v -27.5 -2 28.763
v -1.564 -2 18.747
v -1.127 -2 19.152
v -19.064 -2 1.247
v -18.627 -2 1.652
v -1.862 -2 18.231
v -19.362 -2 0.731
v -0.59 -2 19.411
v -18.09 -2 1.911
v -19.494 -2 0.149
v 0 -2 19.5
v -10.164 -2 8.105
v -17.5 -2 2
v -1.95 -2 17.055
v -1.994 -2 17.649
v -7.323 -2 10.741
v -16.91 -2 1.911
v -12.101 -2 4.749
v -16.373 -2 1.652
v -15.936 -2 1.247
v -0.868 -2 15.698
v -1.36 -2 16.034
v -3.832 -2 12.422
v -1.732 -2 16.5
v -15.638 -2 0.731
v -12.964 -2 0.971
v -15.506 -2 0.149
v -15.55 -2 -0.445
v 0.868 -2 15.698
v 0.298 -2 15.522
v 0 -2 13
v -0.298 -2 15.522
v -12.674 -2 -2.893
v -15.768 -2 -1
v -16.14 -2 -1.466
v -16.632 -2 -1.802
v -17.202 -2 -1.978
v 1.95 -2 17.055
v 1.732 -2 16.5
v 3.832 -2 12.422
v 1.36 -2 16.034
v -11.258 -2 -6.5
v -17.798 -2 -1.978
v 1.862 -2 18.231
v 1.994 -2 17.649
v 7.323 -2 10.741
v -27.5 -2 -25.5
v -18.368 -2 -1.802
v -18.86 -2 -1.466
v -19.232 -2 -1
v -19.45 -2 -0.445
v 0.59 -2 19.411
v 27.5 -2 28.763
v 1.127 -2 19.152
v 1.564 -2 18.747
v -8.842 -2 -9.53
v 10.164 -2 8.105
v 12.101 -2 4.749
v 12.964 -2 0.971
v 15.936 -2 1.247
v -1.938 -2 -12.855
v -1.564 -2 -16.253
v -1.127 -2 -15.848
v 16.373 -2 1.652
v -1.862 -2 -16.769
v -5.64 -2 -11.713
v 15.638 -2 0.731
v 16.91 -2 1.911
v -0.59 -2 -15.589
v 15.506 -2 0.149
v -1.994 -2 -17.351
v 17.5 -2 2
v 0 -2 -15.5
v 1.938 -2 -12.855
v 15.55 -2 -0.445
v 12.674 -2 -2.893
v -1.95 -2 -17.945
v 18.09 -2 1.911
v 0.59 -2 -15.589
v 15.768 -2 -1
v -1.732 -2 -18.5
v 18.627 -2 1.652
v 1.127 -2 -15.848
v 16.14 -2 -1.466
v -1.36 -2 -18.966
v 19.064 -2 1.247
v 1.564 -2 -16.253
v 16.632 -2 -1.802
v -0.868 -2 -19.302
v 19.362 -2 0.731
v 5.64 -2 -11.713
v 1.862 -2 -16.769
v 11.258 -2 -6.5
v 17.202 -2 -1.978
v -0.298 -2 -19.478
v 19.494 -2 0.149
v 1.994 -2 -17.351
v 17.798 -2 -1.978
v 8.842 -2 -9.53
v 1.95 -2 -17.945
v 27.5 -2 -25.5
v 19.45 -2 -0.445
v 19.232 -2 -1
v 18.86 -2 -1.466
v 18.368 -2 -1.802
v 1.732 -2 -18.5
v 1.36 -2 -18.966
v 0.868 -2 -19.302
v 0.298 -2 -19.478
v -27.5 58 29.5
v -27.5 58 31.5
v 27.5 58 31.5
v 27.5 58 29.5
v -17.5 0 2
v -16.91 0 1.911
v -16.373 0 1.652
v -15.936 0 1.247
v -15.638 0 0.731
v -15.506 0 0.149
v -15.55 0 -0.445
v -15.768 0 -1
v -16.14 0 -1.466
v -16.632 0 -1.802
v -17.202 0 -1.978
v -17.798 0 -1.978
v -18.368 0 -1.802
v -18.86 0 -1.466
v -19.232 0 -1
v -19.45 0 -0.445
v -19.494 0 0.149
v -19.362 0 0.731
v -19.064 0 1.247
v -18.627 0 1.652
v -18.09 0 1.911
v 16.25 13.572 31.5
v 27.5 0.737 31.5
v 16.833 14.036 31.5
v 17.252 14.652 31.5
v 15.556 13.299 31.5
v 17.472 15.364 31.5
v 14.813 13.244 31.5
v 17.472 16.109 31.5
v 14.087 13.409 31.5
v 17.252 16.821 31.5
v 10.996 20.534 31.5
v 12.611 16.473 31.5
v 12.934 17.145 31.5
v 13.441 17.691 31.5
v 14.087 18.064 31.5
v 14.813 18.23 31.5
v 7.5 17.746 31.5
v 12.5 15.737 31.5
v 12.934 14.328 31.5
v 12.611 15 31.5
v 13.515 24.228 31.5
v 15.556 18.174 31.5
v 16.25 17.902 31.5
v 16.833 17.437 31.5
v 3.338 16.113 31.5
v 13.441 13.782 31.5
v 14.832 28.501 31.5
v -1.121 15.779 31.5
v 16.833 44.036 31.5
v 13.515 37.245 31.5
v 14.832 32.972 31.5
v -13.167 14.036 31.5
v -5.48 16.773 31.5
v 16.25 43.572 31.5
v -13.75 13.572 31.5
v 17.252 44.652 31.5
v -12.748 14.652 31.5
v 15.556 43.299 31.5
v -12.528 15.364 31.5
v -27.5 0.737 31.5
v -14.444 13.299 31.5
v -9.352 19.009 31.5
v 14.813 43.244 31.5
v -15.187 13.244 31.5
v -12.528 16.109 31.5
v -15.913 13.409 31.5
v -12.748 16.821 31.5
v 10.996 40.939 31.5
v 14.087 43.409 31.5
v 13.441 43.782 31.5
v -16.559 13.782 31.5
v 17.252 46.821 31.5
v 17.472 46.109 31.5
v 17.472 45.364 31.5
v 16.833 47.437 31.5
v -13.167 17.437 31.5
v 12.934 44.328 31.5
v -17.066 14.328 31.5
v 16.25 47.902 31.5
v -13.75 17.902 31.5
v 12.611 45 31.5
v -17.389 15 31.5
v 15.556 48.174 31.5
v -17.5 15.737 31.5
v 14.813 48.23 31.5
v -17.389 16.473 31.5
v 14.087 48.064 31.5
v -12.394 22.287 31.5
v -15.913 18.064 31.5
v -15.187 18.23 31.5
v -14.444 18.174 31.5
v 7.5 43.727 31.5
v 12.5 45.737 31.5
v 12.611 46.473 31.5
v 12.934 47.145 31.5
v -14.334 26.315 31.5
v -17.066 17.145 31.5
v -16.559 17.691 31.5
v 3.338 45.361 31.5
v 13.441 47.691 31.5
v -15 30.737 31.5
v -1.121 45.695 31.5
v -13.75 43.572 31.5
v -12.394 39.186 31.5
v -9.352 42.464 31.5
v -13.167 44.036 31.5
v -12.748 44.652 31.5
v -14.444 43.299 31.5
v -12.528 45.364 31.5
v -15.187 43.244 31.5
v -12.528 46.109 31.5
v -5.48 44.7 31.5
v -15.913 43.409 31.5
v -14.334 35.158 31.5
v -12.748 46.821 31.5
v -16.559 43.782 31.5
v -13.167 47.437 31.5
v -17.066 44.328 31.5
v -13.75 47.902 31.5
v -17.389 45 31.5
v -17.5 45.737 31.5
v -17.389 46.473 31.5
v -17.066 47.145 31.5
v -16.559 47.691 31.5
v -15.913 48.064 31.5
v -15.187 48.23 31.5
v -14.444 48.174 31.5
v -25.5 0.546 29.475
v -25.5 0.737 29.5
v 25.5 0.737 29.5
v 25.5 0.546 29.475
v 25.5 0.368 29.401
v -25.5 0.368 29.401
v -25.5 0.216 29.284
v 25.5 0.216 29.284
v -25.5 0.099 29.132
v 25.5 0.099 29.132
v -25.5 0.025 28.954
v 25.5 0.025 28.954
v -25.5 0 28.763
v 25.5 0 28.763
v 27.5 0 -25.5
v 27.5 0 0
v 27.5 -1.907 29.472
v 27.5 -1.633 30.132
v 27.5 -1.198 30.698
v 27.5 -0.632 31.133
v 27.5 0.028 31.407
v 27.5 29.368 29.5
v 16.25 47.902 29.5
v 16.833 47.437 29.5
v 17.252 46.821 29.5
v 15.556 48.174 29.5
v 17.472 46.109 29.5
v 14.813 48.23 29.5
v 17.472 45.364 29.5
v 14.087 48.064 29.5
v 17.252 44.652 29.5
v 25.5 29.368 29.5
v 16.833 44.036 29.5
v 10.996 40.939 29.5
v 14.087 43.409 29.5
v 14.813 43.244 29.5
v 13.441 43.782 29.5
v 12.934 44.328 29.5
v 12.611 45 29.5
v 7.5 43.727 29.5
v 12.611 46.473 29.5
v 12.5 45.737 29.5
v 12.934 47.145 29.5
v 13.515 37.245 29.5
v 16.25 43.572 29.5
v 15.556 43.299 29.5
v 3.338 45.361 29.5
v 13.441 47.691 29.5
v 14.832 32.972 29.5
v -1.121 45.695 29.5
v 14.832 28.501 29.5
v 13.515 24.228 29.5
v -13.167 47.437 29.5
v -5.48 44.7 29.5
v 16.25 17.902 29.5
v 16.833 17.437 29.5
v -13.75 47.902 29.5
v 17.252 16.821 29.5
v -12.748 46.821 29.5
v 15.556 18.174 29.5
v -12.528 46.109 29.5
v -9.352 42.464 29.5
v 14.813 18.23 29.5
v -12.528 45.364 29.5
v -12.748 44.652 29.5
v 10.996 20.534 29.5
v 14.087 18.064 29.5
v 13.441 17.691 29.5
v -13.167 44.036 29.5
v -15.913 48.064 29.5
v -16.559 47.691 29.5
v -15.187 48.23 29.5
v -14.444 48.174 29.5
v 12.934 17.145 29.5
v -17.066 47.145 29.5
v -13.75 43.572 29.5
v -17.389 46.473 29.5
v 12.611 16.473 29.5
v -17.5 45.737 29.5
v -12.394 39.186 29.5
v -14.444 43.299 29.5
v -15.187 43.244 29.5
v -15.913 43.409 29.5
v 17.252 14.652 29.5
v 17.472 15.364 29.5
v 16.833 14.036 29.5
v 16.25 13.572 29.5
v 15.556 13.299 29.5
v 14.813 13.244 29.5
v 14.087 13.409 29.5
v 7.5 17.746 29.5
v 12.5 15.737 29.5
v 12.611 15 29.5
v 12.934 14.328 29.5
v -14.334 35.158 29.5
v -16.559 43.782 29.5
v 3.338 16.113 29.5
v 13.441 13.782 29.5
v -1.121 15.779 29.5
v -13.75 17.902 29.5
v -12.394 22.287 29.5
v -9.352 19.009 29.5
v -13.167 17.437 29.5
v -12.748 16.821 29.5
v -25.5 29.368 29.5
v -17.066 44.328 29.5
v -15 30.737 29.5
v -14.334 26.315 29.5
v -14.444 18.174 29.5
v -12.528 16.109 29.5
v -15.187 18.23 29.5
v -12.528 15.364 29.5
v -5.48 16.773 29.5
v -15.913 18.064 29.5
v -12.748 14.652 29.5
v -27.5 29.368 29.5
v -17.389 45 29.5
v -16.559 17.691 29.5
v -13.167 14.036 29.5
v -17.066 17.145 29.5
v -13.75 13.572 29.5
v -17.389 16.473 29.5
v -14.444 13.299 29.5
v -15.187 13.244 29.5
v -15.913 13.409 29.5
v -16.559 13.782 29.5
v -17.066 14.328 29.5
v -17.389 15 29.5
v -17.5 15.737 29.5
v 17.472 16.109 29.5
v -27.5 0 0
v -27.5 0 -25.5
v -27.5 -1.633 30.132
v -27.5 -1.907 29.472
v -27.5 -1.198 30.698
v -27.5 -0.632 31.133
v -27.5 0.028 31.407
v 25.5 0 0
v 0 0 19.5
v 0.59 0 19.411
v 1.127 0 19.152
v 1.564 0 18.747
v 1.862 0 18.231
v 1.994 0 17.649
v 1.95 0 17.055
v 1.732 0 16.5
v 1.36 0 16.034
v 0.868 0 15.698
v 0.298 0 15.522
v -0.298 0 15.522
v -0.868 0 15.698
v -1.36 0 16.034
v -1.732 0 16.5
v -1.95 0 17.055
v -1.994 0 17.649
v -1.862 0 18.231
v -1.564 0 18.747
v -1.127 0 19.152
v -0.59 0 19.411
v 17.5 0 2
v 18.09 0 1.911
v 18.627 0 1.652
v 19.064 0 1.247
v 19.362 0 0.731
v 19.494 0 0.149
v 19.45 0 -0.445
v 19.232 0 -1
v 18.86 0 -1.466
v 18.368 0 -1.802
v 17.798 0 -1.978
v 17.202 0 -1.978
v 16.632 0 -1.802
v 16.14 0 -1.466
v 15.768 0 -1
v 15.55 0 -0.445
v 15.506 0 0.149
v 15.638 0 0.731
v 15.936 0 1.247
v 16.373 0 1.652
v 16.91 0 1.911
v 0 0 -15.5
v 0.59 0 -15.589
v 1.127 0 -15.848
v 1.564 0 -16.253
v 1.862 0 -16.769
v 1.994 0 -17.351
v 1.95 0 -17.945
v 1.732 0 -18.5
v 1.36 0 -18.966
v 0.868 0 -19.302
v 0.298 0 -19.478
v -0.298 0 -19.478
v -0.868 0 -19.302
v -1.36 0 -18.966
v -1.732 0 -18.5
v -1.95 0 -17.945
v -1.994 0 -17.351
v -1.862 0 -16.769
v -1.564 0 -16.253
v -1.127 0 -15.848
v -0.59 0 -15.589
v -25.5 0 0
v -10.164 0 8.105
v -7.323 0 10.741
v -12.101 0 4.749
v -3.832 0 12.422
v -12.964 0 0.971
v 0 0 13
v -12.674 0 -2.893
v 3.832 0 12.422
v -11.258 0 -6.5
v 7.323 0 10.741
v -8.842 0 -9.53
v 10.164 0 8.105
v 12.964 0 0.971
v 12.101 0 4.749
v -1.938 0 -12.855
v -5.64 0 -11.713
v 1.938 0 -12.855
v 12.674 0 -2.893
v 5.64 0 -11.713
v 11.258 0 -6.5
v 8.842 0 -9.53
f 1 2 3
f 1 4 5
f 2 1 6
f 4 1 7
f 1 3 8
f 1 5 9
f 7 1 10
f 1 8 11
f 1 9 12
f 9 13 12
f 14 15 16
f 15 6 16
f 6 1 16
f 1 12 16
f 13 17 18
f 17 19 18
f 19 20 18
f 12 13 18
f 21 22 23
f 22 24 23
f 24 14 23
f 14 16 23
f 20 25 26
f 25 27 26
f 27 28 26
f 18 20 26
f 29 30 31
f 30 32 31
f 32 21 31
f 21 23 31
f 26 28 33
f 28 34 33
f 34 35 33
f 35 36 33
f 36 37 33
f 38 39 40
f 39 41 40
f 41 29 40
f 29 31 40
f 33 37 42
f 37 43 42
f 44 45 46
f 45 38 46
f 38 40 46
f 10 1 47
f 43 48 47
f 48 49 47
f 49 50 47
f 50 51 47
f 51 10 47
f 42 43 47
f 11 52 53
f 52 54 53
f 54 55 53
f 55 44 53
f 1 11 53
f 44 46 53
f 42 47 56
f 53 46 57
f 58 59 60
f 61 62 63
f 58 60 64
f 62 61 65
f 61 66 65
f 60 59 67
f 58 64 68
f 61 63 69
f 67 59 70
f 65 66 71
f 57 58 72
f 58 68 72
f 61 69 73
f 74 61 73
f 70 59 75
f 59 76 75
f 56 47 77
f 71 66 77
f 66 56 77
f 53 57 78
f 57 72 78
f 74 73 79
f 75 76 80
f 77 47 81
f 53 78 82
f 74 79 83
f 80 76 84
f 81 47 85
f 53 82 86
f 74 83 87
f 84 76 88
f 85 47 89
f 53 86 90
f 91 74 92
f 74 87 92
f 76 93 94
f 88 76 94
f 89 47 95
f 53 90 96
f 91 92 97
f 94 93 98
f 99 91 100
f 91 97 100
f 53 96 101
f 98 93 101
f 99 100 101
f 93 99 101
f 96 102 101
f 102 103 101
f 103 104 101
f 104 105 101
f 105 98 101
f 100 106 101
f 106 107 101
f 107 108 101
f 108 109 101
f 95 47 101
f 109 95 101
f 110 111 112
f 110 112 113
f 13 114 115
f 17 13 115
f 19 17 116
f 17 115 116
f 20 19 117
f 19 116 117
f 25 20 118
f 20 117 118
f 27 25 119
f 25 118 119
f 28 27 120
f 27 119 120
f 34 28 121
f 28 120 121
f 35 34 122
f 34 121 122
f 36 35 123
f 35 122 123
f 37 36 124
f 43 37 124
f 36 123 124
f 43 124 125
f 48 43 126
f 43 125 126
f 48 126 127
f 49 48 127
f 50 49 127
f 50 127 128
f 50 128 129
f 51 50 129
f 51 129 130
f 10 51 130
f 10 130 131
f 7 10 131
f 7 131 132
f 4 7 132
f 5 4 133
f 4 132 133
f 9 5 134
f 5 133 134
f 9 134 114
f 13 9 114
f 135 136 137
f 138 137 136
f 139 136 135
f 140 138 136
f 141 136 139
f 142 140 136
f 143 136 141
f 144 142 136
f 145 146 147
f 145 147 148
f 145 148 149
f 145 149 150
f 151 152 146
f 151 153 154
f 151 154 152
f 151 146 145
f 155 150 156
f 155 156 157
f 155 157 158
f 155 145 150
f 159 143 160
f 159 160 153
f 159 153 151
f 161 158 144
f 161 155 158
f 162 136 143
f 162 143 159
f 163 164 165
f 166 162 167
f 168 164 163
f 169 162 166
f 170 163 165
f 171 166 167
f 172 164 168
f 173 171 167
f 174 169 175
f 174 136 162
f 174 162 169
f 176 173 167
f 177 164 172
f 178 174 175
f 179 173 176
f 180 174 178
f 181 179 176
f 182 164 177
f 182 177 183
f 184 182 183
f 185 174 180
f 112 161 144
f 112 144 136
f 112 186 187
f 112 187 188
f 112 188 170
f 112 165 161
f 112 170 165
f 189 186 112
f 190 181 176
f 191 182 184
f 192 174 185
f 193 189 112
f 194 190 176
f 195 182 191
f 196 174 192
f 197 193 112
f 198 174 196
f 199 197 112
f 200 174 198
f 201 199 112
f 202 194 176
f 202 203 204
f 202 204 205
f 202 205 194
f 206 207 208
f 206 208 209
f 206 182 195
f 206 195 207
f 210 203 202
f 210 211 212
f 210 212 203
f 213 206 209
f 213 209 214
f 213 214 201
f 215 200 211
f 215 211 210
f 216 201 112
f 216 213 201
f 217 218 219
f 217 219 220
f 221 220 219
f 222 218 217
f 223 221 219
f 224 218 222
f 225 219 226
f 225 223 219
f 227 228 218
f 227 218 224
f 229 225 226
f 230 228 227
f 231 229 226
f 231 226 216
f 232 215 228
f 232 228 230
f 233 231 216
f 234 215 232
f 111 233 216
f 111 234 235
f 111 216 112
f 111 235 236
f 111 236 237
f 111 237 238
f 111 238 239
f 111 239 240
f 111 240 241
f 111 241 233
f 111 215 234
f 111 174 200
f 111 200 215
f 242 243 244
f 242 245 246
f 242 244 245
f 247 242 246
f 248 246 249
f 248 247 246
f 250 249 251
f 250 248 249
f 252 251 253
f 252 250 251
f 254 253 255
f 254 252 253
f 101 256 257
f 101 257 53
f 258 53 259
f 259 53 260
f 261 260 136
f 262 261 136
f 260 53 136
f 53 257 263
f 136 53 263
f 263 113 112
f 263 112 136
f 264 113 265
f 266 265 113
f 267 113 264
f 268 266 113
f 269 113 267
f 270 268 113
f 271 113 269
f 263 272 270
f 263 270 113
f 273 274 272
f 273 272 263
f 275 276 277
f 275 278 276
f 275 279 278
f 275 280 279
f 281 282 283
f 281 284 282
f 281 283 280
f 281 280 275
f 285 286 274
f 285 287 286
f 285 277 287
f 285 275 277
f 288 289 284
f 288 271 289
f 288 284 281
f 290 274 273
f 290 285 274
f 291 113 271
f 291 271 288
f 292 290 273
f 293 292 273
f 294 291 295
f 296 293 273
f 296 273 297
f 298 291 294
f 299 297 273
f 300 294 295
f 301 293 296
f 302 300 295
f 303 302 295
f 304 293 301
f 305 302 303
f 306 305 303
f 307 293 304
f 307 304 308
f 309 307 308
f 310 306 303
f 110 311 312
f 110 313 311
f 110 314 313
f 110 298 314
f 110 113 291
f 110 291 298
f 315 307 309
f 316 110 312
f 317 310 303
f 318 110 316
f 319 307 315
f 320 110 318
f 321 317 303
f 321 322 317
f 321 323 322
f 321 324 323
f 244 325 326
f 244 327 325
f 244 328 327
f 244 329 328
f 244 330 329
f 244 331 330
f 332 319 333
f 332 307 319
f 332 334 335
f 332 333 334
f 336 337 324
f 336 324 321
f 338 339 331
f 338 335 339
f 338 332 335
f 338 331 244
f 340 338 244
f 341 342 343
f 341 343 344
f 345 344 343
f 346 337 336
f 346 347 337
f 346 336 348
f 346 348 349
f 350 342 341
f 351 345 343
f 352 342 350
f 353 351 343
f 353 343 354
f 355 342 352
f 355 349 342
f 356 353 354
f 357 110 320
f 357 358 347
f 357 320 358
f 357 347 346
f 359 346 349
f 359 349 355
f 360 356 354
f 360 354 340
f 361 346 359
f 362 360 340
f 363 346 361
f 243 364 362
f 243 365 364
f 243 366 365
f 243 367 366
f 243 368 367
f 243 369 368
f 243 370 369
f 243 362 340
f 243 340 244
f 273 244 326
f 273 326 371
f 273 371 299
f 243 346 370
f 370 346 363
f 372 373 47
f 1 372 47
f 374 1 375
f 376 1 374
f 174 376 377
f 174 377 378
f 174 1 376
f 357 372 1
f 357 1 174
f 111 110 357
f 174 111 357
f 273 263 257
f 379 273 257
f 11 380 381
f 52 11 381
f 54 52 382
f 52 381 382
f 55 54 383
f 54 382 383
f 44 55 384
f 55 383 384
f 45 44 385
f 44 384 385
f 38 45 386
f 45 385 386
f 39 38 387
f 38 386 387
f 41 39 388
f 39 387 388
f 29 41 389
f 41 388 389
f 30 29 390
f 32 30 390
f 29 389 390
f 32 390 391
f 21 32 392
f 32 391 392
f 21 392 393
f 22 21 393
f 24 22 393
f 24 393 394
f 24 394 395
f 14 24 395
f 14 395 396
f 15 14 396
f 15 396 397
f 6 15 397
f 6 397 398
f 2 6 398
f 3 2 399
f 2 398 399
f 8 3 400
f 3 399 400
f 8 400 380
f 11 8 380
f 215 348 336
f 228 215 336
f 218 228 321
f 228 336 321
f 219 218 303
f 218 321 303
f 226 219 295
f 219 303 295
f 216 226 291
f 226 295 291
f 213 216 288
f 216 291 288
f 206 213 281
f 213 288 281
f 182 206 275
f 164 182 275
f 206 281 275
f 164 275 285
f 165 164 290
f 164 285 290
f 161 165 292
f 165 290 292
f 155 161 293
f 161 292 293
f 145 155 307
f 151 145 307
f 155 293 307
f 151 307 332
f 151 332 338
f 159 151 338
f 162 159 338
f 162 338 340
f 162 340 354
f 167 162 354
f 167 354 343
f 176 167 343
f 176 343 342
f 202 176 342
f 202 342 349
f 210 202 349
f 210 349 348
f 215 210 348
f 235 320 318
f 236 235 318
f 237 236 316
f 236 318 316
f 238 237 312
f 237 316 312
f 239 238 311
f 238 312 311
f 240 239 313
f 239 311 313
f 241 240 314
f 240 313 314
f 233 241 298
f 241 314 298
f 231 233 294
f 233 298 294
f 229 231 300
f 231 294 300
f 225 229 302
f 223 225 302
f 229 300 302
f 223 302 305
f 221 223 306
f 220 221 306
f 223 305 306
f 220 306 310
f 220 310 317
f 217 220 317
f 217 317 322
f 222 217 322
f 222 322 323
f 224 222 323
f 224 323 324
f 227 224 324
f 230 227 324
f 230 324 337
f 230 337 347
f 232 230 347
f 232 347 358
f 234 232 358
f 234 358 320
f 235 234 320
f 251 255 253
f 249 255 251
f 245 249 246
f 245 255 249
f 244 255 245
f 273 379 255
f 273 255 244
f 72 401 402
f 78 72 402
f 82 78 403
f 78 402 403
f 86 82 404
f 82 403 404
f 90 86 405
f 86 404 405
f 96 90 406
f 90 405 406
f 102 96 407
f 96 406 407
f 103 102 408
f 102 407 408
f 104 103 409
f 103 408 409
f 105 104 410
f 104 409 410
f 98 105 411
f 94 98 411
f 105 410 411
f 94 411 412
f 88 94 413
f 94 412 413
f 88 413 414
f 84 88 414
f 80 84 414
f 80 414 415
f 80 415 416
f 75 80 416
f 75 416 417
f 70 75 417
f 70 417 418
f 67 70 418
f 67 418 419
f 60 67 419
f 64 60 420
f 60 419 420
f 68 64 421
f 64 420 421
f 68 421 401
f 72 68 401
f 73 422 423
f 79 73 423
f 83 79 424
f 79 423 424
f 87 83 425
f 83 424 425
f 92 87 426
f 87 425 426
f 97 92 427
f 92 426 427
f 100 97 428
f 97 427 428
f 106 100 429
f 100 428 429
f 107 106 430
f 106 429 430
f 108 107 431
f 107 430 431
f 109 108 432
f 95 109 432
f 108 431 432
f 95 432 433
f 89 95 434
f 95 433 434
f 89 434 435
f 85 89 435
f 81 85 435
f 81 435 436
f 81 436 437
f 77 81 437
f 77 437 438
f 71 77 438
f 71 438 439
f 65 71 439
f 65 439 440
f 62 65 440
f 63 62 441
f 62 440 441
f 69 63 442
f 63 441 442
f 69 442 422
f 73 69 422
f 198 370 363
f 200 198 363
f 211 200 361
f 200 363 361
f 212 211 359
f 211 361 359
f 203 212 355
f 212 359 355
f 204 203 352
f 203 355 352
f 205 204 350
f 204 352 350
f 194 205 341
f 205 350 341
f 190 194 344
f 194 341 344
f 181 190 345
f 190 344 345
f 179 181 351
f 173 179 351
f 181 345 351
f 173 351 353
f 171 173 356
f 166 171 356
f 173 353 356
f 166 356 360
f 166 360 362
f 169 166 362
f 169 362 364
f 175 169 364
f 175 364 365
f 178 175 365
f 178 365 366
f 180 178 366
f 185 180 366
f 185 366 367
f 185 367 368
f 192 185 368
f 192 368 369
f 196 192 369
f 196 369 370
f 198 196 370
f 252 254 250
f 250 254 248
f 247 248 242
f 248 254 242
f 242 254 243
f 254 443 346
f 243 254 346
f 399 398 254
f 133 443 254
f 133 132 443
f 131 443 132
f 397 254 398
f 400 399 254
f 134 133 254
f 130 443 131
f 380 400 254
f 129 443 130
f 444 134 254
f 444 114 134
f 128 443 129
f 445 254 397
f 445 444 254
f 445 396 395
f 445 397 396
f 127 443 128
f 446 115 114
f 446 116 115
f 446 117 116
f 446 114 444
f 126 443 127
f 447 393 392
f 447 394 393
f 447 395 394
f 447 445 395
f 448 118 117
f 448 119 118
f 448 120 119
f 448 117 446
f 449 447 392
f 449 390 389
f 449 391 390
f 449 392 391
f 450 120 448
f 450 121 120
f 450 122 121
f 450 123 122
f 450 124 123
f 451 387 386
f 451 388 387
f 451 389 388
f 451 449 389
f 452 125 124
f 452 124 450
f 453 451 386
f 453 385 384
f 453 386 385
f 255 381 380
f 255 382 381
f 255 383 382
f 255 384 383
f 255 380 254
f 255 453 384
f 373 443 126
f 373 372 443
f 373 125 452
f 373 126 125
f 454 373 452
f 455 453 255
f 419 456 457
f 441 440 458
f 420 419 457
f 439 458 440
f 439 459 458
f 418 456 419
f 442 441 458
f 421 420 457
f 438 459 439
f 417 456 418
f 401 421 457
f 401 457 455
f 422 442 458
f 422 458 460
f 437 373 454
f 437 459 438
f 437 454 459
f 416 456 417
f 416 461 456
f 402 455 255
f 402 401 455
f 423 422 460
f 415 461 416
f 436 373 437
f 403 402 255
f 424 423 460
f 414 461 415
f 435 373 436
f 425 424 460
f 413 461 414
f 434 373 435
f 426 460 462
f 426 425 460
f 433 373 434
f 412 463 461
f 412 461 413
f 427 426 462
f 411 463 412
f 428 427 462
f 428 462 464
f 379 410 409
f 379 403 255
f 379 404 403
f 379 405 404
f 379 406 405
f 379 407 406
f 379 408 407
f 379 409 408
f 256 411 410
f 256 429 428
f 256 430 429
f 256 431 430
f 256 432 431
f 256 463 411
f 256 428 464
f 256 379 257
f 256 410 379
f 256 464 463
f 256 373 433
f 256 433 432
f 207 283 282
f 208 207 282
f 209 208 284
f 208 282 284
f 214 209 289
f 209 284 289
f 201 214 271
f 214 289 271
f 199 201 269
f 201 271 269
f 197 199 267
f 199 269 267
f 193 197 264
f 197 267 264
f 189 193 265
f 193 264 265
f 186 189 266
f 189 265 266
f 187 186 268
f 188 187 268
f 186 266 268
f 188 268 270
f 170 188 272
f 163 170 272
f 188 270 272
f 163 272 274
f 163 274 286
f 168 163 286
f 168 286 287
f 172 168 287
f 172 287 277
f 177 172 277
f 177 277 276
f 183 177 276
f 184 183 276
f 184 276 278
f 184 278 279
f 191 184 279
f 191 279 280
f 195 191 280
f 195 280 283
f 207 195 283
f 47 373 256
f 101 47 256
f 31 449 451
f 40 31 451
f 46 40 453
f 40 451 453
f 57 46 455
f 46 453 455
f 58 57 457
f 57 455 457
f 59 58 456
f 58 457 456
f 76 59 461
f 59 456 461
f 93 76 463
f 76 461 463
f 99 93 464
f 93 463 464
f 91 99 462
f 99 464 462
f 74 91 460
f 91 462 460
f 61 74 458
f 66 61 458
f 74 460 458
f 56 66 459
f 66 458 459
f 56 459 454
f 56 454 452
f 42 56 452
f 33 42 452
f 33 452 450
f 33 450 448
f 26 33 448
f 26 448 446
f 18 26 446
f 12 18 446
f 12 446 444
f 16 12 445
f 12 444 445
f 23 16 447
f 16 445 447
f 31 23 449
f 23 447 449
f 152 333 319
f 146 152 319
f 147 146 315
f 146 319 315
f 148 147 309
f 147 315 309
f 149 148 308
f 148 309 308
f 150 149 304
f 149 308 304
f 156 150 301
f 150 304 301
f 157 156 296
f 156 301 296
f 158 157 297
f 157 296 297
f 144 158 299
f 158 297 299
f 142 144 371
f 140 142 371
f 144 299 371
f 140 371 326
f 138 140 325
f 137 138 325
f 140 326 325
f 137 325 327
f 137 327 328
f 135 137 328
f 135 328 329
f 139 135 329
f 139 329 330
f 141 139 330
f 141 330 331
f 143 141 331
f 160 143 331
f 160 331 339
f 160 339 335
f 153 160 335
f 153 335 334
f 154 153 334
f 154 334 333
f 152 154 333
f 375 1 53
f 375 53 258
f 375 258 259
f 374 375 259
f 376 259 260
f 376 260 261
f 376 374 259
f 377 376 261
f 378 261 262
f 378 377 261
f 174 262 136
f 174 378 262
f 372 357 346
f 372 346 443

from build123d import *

# Parameters (mm, degrees)
SKETCH_1_W                       = 55
SKETCH_1_H                       = 55
SKETCH_1_R                       = 13
SKETCH_1_R_2                     = 2
SM_BASE_FLANGE_1_DEPTH           = 2
SM_EDGE_FLANGE_1_STRIP_W         = 9.4732
SM_EDGE_FLANGE_1_STRIP_H         = 2
SM_EDGE_FLANGE_1_STRIP_CUT_DEPTH = 55
SM_EDGE_FLANGE_1_DEPTH           = 55
SKETCH_9_R                       = 15
SKETCH_9_R_2                     = 2.5
CUT_EXTRUDE_1_DEPTH              = 10
EXTRUDE_1_DEPTH                  = 2
EXTRUDE_2_DEPTH                  = 2


# Sheet-metal steps are written as plain solids
with BuildPart() as part:
    # Sketch 1 → 基体-法兰1 (new body)
    with BuildSketch(Plane(origin=(0, 0, 0), x_dir=(1, 0, 0), z_dir=(0, 1, 0))):
        with Locations((0, -2)):
            Rectangle(SKETCH_1_W, SKETCH_1_H)
        with Locations(Location((0, 0, 0), (0, 0, 270))):
            Circle(SKETCH_1_R, mode=Mode.SUBTRACT)
        with Locations(Location((17.5, 0, 0), (0, 0, 270))):
            Circle(SKETCH_1_R_2, mode=Mode.SUBTRACT)
        with Locations(Location((-17.5, 0, 0), (0, 0, 270))):
            Circle(SKETCH_1_R_2, mode=Mode.SUBTRACT)
        with Locations(Location((0, 17.5, 0), (0, 0, 270))):
            Circle(SKETCH_1_R_2, mode=Mode.SUBTRACT)
        with Locations(Location((0, -17.5, 0), (0, 0, 270))):
            Circle(SKETCH_1_R_2, mode=Mode.SUBTRACT)
    extrude(amount=-SM_BASE_FLANGE_1_DEPTH)

    # 边线-法兰1 strip (across the edge) → 边线-法兰1 strip cut (cut)
    with BuildSketch(Plane(origin=(-27.5, 0, 29.5), x_dir=(0, 0, -1), z_dir=(1, 0, 0))):
        with Locations((-4, -1)):
            Rectangle(SM_EDGE_FLANGE_1_STRIP_W, SM_EDGE_FLANGE_1_STRIP_H)
    extrude(amount=SM_EDGE_FLANGE_1_STRIP_CUT_DEPTH, mode=Mode.SUBTRACT)

    # 边线-法兰1 section (across the edge) → 边线-法兰1 (add)
    with BuildSketch(Plane(origin=(-27.5, 0, 29.5), x_dir=(0, 0, -1), z_dir=(1, 0, 0))):
        with BuildLine():
            Line((-2, 0.7366), (-2, 58))
            Line((-2, 58), (0, 58))
            Line((0, 58), (0, 0.7366))
            ThreePointArc((0, 0.7366), (0.215745145, 0.215745145), (0.7366, 0))
            Line((0.7366, 0), (0.7366, -2))
            ThreePointArc((0.7366, -2), (-1.198468417, -1.198468417), (-2, 0.7366))
        make_face()
    extrude(amount=SM_EDGE_FLANGE_1_DEPTH)

    # 草图9 → 切除-拉伸1 (cut)
    with BuildSketch(Plane(origin=(0, 0, 29.5), x_dir=(-1, 0, 0), z_dir=(0, 0, -1))):
        with Locations((0, 30.7366)):
            Circle(SKETCH_9_R)
        with Locations((-15, 45.7366)):
            Circle(SKETCH_9_R_2)
        with Locations((-15, 15.7366)):
            Circle(SKETCH_9_R_2)
        with Locations((15, 15.7366)):
            Circle(SKETCH_9_R_2)
        with Locations((15, 45.7366)):
            Circle(SKETCH_9_R_2)
    extrude(amount=-CUT_EXTRUDE_1_DEPTH, mode=Mode.SUBTRACT)

    # 草图10 → 凸台-拉伸1 (add)
    with BuildSketch(Plane(origin=(27.5, 0, 0), x_dir=(0, 0, -1), z_dir=(1, 0, 0))):
        Polygon((-29.5, 29.3683), (0, 0), (-29.5, 0), align=None)
    extrude(amount=-EXTRUDE_1_DEPTH)

    # 草图11 → 凸台-拉伸2 (add)
    with BuildSketch(Plane.ZY.offset(27.5)):
        Polygon((29.5, 29.3683), (0, 0), (29.5, 0), align=None)
    extrude(amount=-EXTRUDE_2_DEPTH)


solid = part.part
